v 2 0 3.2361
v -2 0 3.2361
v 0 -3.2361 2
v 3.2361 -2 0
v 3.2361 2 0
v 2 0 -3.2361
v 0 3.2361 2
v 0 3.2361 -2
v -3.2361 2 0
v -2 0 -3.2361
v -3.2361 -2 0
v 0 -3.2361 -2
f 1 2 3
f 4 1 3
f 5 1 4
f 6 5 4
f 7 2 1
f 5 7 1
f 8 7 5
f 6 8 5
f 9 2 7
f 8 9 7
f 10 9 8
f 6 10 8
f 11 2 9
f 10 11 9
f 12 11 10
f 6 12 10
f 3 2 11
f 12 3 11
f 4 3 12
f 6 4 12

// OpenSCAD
/*****************************************************************
* Icosahedron   By Adam Anderson
* 
* This module allows for the creation of an icosahedron scaled up 
* by a factor determined by the module parameter. 
* The coordinates for the vertices were taken from
* http://www.sacred-geometry.es/?q=en/content/phi-sacred-solids
*************************************************************/
icosahedron();

module icosahedron(a = 2) {
    phi = a * ((1 + sqrt(5)) / 2);
    polyhedron(
        points = [
            [0,-phi, a], [0, phi, a], [0, phi, -a], [0, -phi, -a], [a, 0, phi], [-a, 0, phi], [-a, 0, -phi], 
            [a, 0, -phi], [phi, a, 0], [-phi, a, 0], [-phi, -a, 0], [phi, -a, 0]    
        ],
        faces = [
            [0,5,4], [0,4,11], [11,4,8], [11,8,7], [4,5,1], [4,1,8], [8,1,2], [8,2,7], [1,5,9], [1,9,2], [2,9,6], [2,6,7], [9,5,10], [9,10,6], [6,10,3], [6,3,7], [10,5,0], [10,0,3], [3,0,11], [3,11,7]
        ]
    
    );
}
